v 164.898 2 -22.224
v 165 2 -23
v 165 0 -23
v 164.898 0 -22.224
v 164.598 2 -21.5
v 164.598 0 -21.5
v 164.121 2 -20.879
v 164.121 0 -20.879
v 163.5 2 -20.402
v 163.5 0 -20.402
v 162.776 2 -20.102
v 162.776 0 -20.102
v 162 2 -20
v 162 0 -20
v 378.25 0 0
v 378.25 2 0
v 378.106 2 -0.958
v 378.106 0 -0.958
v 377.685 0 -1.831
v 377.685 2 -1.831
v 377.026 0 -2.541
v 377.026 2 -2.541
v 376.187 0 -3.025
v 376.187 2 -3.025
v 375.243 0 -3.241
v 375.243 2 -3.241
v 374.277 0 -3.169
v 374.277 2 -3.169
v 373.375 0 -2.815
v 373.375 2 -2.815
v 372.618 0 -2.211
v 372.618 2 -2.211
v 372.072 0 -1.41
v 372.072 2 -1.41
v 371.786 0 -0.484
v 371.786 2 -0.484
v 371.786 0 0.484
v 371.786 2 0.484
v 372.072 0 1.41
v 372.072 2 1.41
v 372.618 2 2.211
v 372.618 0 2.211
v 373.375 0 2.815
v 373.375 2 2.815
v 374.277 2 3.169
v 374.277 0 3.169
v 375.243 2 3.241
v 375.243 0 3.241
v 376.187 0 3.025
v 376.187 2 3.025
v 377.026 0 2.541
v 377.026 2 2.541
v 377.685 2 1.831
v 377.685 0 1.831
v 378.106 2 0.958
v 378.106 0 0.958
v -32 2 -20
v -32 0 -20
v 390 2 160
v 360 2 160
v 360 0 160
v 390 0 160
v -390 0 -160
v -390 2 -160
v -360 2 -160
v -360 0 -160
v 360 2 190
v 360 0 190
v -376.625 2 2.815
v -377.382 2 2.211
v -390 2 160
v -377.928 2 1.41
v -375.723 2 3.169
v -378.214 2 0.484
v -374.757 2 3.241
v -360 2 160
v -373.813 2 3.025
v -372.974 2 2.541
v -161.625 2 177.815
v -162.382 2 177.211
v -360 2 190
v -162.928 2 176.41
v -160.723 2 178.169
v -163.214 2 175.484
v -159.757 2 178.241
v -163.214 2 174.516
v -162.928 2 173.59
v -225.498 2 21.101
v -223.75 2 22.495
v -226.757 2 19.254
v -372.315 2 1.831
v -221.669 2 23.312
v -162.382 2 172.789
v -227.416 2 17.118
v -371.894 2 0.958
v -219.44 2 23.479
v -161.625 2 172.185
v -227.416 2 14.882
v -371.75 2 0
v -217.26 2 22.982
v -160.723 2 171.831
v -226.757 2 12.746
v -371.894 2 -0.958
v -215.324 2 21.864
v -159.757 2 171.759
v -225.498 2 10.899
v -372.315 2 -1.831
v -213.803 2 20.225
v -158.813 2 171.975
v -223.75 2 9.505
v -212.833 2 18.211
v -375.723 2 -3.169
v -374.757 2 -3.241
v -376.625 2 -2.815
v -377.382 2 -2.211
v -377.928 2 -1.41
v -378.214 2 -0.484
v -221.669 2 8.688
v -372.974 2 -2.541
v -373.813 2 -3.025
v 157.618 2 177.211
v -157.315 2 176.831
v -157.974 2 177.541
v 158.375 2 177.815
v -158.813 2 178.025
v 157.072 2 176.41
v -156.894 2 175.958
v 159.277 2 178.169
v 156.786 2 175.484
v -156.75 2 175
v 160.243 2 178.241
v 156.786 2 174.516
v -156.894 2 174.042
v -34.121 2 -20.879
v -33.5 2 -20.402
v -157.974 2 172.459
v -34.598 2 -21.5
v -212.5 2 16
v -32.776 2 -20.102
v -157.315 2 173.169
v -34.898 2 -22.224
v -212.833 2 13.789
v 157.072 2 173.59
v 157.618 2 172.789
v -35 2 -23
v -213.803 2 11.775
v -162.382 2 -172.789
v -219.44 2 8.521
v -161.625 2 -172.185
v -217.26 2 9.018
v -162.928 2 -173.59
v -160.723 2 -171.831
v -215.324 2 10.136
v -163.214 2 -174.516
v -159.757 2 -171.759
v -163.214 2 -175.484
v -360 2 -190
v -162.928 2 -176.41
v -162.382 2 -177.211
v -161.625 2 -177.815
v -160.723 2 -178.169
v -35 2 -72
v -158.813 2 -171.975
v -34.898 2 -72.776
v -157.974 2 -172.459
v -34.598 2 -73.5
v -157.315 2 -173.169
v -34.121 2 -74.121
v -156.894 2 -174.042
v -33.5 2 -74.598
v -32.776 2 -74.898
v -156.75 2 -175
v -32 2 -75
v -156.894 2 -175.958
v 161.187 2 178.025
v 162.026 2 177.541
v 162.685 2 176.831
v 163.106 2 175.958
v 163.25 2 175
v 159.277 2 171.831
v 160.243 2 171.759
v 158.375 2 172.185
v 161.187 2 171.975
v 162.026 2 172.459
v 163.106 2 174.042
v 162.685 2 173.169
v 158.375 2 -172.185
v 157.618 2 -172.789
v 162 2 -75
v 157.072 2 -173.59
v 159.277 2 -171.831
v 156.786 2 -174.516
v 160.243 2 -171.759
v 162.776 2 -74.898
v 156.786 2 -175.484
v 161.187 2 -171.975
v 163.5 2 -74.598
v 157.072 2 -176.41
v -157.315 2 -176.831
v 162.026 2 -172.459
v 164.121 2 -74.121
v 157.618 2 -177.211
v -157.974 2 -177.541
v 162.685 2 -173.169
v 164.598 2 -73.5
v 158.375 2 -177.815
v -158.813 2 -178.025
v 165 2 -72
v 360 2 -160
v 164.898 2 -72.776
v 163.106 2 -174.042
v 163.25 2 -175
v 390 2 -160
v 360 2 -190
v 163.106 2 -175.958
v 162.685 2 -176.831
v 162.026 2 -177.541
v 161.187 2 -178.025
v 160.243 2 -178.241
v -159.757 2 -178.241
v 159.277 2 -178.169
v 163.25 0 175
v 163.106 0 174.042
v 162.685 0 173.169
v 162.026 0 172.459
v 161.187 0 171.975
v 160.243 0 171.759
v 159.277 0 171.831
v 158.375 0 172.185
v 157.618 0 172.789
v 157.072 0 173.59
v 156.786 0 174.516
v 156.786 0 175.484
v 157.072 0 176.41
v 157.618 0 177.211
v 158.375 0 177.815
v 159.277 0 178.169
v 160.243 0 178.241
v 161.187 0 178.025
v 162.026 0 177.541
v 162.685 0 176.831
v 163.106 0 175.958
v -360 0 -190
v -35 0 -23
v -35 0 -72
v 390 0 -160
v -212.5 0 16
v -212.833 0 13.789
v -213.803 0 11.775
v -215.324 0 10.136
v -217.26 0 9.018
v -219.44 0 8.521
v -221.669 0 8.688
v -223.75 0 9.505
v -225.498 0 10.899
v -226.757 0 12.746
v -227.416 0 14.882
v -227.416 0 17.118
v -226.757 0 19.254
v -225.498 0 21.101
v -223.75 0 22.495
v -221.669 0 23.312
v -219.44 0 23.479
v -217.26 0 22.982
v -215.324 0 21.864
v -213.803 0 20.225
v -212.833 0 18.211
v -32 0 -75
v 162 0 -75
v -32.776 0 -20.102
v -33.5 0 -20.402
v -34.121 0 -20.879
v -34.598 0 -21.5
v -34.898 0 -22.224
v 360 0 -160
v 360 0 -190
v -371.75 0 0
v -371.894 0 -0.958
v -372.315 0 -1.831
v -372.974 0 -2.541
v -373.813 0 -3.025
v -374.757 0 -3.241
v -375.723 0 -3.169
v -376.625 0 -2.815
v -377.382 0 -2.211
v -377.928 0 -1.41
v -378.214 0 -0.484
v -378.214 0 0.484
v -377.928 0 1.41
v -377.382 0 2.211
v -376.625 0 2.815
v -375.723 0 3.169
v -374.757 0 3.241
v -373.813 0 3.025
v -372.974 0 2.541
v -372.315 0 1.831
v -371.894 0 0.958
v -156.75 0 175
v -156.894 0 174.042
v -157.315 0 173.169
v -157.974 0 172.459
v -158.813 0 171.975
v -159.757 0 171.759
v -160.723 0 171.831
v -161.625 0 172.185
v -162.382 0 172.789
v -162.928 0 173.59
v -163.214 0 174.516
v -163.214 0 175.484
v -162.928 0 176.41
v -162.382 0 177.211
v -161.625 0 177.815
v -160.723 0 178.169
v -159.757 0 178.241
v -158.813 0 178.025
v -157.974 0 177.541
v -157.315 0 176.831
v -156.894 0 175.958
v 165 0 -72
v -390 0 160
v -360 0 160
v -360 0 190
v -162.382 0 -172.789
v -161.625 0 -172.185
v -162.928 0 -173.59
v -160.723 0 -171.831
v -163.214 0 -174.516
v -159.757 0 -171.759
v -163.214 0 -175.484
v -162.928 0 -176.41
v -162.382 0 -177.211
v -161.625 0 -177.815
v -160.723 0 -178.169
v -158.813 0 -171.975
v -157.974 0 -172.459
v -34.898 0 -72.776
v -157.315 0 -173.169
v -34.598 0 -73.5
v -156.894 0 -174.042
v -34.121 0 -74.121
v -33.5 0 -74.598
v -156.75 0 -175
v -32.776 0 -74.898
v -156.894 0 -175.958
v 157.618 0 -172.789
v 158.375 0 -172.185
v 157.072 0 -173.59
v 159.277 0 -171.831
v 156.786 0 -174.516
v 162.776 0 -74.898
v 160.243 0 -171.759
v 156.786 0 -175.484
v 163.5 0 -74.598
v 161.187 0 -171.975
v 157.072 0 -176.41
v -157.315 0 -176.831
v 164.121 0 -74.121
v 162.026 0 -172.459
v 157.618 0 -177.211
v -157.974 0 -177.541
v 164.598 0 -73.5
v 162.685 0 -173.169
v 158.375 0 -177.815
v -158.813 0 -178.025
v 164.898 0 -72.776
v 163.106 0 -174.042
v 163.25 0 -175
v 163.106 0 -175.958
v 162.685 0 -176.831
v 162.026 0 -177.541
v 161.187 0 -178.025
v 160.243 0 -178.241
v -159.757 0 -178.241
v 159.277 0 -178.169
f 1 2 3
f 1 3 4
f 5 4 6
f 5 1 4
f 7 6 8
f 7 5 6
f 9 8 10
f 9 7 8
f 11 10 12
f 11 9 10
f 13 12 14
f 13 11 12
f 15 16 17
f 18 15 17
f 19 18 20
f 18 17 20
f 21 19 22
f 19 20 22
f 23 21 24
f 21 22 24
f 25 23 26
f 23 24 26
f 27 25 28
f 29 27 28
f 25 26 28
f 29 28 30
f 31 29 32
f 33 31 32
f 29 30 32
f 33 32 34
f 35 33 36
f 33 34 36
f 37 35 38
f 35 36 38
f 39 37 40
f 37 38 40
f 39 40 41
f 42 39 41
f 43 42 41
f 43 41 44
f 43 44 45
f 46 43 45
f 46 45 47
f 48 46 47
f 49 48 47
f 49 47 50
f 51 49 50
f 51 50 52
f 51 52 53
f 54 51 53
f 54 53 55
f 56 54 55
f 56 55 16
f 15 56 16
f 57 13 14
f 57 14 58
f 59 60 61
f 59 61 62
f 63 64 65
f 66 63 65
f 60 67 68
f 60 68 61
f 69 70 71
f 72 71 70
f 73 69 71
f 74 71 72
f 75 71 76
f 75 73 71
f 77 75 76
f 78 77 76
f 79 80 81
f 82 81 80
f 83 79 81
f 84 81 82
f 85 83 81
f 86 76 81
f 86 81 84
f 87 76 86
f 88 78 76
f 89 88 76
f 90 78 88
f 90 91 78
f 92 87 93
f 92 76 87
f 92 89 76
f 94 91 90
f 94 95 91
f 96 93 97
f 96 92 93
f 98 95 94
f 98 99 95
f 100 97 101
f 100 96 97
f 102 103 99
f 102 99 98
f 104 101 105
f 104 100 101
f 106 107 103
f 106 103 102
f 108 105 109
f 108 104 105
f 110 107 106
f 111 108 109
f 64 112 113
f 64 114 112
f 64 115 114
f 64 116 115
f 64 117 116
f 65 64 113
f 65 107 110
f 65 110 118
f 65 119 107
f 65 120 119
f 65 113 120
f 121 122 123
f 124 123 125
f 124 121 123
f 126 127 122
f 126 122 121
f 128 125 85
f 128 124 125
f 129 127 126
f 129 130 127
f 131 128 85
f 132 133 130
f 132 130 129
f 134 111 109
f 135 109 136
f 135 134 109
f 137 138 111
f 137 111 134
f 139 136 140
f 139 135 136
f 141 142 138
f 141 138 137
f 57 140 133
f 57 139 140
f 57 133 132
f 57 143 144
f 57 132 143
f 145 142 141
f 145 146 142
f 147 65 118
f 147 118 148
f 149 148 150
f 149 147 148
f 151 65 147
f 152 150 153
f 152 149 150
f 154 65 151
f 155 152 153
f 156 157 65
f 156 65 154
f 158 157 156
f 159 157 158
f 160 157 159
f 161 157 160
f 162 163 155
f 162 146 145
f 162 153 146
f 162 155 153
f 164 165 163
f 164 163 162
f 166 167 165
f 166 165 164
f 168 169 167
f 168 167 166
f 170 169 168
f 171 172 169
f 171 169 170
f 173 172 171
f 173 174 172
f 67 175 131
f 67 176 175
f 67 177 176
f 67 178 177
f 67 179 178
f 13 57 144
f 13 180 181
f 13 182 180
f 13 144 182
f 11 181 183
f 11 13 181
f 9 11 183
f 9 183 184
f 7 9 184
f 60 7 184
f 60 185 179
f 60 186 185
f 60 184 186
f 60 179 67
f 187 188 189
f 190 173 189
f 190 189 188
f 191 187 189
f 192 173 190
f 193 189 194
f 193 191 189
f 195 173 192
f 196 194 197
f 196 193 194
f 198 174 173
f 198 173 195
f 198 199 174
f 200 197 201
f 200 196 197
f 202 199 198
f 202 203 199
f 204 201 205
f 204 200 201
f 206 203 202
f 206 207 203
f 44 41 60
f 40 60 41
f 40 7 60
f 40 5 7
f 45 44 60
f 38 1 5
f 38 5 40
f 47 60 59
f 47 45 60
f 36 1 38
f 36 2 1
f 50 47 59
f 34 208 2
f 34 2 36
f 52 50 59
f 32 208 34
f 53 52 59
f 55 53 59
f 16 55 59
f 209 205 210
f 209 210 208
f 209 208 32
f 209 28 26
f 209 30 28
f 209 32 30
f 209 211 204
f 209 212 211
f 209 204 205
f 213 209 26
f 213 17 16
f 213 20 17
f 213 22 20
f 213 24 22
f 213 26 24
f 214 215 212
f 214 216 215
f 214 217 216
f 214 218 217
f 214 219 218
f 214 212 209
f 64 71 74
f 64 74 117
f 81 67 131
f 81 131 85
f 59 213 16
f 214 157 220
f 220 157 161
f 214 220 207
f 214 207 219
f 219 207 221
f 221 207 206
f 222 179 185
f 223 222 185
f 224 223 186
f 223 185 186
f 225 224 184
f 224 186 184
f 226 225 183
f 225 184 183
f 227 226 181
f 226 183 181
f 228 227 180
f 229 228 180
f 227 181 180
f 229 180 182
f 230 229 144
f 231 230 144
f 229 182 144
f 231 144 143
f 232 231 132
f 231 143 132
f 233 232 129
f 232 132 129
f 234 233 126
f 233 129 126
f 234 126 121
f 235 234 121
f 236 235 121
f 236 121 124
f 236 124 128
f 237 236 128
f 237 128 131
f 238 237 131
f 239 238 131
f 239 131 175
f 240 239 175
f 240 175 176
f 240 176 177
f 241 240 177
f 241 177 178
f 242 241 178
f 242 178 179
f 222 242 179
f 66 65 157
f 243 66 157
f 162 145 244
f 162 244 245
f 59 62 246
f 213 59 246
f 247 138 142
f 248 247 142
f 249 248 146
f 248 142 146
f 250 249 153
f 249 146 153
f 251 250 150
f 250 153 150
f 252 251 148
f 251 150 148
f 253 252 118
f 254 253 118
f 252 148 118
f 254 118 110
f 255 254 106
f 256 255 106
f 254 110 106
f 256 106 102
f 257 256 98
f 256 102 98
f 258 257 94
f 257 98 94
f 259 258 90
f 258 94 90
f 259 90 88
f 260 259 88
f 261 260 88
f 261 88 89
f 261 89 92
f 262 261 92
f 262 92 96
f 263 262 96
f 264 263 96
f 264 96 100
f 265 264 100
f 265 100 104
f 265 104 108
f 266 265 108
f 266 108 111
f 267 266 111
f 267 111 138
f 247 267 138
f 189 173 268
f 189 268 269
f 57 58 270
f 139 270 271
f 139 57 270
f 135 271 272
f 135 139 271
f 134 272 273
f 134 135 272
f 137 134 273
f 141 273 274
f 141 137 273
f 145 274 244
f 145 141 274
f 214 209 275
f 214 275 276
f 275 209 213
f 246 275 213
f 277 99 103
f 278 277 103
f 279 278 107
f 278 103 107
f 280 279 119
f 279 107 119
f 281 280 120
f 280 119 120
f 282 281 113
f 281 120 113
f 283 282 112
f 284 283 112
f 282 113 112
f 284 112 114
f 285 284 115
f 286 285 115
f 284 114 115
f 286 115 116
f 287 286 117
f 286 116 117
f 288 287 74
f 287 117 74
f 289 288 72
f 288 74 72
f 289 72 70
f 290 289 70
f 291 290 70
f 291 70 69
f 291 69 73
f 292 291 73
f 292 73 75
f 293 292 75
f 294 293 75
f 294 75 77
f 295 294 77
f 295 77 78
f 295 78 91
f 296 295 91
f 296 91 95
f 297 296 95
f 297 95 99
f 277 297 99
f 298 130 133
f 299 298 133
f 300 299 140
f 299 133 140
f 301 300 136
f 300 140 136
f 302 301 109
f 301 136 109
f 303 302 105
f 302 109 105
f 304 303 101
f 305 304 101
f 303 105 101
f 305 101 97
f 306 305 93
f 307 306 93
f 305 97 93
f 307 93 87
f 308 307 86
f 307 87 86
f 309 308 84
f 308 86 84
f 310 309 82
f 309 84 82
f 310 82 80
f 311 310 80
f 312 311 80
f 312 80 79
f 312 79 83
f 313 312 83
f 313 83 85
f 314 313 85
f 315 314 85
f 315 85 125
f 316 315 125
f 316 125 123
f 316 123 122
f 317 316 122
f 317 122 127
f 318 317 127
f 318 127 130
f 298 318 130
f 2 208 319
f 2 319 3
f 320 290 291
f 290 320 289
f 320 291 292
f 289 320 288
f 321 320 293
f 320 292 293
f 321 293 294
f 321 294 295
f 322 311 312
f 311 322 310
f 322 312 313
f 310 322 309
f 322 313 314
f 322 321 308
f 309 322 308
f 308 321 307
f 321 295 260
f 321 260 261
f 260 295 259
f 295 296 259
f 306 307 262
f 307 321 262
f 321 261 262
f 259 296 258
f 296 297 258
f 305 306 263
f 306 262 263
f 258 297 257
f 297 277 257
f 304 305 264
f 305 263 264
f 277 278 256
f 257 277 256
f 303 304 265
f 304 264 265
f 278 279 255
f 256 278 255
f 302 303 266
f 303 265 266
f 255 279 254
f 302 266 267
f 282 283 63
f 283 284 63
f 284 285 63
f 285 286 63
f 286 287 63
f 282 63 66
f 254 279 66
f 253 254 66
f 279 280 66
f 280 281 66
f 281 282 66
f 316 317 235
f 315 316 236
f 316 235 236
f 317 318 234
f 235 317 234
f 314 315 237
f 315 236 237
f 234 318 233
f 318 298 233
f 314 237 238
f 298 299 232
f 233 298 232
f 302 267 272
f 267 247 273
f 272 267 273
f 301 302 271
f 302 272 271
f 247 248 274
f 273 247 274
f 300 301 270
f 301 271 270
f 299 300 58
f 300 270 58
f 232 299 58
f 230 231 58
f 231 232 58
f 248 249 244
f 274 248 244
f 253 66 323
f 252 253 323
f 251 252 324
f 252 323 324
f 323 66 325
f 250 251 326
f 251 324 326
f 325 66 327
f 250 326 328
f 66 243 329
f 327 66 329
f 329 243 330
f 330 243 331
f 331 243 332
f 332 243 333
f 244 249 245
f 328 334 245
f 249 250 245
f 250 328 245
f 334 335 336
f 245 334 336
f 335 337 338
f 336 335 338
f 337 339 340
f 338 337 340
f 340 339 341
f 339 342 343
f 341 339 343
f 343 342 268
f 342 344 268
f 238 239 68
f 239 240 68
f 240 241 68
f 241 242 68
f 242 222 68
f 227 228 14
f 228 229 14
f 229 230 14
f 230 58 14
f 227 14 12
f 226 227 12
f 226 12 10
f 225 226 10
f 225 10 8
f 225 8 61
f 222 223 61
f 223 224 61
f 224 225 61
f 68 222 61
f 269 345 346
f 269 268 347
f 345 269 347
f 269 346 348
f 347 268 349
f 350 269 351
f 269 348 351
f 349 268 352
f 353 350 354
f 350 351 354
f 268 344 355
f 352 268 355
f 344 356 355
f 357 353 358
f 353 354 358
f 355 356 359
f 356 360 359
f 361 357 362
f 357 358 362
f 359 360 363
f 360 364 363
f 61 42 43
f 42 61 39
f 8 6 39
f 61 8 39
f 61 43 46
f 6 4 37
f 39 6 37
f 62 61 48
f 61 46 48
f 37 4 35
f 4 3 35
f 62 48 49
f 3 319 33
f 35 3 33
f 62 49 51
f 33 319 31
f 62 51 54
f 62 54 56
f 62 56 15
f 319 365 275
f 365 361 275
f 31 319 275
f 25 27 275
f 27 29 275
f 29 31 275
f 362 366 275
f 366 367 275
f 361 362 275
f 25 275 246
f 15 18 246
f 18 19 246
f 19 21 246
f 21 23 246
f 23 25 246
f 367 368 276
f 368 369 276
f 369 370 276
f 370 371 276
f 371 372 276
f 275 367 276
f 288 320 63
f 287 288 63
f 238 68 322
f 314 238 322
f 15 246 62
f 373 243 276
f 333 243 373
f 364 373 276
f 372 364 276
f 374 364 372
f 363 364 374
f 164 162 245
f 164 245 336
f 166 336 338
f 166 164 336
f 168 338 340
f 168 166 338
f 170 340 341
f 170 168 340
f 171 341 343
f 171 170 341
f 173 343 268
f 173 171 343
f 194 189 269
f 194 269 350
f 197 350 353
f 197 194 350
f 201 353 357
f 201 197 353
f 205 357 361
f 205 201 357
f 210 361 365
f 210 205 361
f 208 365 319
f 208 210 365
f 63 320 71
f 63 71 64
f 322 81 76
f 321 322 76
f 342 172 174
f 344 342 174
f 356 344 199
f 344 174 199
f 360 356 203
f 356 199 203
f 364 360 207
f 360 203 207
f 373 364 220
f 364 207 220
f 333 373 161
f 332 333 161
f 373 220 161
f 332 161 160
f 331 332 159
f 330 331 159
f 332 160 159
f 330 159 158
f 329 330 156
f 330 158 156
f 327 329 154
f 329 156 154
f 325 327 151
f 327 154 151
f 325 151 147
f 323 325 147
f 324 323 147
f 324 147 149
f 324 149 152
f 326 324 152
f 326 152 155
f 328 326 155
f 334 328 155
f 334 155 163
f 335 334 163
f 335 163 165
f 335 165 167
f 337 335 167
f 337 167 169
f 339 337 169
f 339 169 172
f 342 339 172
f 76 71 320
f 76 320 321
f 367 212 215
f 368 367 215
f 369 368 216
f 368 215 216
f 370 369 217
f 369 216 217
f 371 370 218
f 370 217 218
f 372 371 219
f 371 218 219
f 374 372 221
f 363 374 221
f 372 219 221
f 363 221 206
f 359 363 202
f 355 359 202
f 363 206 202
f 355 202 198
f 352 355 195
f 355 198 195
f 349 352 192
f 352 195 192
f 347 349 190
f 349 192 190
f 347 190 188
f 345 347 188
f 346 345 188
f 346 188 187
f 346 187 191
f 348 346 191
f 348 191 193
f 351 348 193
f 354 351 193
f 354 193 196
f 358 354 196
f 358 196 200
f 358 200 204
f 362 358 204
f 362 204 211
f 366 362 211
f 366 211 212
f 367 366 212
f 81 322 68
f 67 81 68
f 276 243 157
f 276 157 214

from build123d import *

# Parameters (mm, degrees)
SKETCH2_W           = 780
SKETCH2_H           = 380
BOSS_EXTRUDE1_DEPTH = 2
SKETCH3_W           = 30
SKETCH3_H           = 30
CUT_EXTRUDE1_DEPTH  = 3
SKETCH4_R           = 3.25
CUT_EXTRUDE2_DEPTH  = 3
SKETCH5_R           = 7.5
CUT_EXTRUDE3_DEPTH  = 3
CUT_EXTRUDE4_DEPTH  = 3


with BuildPart() as part:
    # Sketch2 → Boss-Extrude1 (new body)
    with BuildSketch(Plane(origin=(0, 0, 0), x_dir=(1, 0, 0), z_dir=(0, 1, 0))):
        Rectangle(SKETCH2_W, SKETCH2_H)
    extrude(amount=BOSS_EXTRUDE1_DEPTH)

    # Sketch3 → Cut-Extrude1 (cut, through all)
    with BuildSketch(Plane(origin=(0, 2, 0), x_dir=(1, 0, 0), z_dir=(0, 1, 0))):
        with Locations((-375, 175)):
            Rectangle(SKETCH3_W, SKETCH3_H)
        with Locations((375, 175)):
            Rectangle(SKETCH3_W, SKETCH3_H)
        with Locations((375, -175)):
            Rectangle(SKETCH3_W, SKETCH3_H)
        with Locations((-375, -175)):
            Rectangle(SKETCH3_W, SKETCH3_H)
    extrude(amount=-CUT_EXTRUDE1_DEPTH, mode=Mode.SUBTRACT)

    # Sketch4 → Cut-Extrude2 (cut, through all)
    with BuildSketch(Plane(origin=(0, 2, 0), x_dir=(1, 0, 0), z_dir=(0, 1, 0))):
        with Locations((-375, 0)):
            Circle(SKETCH4_R)
        with Locations((375, 0)):
            Circle(SKETCH4_R)
        with Locations((-160, 175)):
            Circle(SKETCH4_R)
        with Locations((160, 175)):
            Circle(SKETCH4_R)
        with Locations((-160, -175)):
            Circle(SKETCH4_R)
        with Locations((160, -175)):
            Circle(SKETCH4_R)
    extrude(amount=-CUT_EXTRUDE2_DEPTH, mode=Mode.SUBTRACT)

    # Sketch5 → Cut-Extrude3 (cut, through all)
    with BuildSketch(Plane(origin=(0, 2, 0), x_dir=(1, 0, 0), z_dir=(0, 1, 0))):
        with Locations((-220, -16)):
            Circle(SKETCH5_R)
    extrude(amount=-CUT_EXTRUDE3_DEPTH, mode=Mode.SUBTRACT)

    # Sketch6 → Cut-Extrude4 (cut, through all)
    with BuildSketch(Plane(origin=(0, 2, 0), x_dir=(1, 0, 0), z_dir=(0, 1, 0))):
        with BuildLine():
            Line((-32, 75), (162, 75))
            ThreePointArc((162, 75), (164.121320344, 74.121320344), (165, 72))
            Line((165, 72), (165, 23))
            ThreePointArc((165, 23), (164.121320344, 20.878679656), (162, 20))
            Line((162, 20), (-32, 20))
            ThreePointArc((-32, 20), (-34.121320344, 20.878679656), (-35, 23))
            Line((-35, 23), (-35, 72))
            ThreePointArc((-35, 72), (-34.121320344, 74.121320344), (-32, 75))
        make_face()
    extrude(amount=-CUT_EXTRUDE4_DEPTH, mode=Mode.SUBTRACT)


solid = part.part
